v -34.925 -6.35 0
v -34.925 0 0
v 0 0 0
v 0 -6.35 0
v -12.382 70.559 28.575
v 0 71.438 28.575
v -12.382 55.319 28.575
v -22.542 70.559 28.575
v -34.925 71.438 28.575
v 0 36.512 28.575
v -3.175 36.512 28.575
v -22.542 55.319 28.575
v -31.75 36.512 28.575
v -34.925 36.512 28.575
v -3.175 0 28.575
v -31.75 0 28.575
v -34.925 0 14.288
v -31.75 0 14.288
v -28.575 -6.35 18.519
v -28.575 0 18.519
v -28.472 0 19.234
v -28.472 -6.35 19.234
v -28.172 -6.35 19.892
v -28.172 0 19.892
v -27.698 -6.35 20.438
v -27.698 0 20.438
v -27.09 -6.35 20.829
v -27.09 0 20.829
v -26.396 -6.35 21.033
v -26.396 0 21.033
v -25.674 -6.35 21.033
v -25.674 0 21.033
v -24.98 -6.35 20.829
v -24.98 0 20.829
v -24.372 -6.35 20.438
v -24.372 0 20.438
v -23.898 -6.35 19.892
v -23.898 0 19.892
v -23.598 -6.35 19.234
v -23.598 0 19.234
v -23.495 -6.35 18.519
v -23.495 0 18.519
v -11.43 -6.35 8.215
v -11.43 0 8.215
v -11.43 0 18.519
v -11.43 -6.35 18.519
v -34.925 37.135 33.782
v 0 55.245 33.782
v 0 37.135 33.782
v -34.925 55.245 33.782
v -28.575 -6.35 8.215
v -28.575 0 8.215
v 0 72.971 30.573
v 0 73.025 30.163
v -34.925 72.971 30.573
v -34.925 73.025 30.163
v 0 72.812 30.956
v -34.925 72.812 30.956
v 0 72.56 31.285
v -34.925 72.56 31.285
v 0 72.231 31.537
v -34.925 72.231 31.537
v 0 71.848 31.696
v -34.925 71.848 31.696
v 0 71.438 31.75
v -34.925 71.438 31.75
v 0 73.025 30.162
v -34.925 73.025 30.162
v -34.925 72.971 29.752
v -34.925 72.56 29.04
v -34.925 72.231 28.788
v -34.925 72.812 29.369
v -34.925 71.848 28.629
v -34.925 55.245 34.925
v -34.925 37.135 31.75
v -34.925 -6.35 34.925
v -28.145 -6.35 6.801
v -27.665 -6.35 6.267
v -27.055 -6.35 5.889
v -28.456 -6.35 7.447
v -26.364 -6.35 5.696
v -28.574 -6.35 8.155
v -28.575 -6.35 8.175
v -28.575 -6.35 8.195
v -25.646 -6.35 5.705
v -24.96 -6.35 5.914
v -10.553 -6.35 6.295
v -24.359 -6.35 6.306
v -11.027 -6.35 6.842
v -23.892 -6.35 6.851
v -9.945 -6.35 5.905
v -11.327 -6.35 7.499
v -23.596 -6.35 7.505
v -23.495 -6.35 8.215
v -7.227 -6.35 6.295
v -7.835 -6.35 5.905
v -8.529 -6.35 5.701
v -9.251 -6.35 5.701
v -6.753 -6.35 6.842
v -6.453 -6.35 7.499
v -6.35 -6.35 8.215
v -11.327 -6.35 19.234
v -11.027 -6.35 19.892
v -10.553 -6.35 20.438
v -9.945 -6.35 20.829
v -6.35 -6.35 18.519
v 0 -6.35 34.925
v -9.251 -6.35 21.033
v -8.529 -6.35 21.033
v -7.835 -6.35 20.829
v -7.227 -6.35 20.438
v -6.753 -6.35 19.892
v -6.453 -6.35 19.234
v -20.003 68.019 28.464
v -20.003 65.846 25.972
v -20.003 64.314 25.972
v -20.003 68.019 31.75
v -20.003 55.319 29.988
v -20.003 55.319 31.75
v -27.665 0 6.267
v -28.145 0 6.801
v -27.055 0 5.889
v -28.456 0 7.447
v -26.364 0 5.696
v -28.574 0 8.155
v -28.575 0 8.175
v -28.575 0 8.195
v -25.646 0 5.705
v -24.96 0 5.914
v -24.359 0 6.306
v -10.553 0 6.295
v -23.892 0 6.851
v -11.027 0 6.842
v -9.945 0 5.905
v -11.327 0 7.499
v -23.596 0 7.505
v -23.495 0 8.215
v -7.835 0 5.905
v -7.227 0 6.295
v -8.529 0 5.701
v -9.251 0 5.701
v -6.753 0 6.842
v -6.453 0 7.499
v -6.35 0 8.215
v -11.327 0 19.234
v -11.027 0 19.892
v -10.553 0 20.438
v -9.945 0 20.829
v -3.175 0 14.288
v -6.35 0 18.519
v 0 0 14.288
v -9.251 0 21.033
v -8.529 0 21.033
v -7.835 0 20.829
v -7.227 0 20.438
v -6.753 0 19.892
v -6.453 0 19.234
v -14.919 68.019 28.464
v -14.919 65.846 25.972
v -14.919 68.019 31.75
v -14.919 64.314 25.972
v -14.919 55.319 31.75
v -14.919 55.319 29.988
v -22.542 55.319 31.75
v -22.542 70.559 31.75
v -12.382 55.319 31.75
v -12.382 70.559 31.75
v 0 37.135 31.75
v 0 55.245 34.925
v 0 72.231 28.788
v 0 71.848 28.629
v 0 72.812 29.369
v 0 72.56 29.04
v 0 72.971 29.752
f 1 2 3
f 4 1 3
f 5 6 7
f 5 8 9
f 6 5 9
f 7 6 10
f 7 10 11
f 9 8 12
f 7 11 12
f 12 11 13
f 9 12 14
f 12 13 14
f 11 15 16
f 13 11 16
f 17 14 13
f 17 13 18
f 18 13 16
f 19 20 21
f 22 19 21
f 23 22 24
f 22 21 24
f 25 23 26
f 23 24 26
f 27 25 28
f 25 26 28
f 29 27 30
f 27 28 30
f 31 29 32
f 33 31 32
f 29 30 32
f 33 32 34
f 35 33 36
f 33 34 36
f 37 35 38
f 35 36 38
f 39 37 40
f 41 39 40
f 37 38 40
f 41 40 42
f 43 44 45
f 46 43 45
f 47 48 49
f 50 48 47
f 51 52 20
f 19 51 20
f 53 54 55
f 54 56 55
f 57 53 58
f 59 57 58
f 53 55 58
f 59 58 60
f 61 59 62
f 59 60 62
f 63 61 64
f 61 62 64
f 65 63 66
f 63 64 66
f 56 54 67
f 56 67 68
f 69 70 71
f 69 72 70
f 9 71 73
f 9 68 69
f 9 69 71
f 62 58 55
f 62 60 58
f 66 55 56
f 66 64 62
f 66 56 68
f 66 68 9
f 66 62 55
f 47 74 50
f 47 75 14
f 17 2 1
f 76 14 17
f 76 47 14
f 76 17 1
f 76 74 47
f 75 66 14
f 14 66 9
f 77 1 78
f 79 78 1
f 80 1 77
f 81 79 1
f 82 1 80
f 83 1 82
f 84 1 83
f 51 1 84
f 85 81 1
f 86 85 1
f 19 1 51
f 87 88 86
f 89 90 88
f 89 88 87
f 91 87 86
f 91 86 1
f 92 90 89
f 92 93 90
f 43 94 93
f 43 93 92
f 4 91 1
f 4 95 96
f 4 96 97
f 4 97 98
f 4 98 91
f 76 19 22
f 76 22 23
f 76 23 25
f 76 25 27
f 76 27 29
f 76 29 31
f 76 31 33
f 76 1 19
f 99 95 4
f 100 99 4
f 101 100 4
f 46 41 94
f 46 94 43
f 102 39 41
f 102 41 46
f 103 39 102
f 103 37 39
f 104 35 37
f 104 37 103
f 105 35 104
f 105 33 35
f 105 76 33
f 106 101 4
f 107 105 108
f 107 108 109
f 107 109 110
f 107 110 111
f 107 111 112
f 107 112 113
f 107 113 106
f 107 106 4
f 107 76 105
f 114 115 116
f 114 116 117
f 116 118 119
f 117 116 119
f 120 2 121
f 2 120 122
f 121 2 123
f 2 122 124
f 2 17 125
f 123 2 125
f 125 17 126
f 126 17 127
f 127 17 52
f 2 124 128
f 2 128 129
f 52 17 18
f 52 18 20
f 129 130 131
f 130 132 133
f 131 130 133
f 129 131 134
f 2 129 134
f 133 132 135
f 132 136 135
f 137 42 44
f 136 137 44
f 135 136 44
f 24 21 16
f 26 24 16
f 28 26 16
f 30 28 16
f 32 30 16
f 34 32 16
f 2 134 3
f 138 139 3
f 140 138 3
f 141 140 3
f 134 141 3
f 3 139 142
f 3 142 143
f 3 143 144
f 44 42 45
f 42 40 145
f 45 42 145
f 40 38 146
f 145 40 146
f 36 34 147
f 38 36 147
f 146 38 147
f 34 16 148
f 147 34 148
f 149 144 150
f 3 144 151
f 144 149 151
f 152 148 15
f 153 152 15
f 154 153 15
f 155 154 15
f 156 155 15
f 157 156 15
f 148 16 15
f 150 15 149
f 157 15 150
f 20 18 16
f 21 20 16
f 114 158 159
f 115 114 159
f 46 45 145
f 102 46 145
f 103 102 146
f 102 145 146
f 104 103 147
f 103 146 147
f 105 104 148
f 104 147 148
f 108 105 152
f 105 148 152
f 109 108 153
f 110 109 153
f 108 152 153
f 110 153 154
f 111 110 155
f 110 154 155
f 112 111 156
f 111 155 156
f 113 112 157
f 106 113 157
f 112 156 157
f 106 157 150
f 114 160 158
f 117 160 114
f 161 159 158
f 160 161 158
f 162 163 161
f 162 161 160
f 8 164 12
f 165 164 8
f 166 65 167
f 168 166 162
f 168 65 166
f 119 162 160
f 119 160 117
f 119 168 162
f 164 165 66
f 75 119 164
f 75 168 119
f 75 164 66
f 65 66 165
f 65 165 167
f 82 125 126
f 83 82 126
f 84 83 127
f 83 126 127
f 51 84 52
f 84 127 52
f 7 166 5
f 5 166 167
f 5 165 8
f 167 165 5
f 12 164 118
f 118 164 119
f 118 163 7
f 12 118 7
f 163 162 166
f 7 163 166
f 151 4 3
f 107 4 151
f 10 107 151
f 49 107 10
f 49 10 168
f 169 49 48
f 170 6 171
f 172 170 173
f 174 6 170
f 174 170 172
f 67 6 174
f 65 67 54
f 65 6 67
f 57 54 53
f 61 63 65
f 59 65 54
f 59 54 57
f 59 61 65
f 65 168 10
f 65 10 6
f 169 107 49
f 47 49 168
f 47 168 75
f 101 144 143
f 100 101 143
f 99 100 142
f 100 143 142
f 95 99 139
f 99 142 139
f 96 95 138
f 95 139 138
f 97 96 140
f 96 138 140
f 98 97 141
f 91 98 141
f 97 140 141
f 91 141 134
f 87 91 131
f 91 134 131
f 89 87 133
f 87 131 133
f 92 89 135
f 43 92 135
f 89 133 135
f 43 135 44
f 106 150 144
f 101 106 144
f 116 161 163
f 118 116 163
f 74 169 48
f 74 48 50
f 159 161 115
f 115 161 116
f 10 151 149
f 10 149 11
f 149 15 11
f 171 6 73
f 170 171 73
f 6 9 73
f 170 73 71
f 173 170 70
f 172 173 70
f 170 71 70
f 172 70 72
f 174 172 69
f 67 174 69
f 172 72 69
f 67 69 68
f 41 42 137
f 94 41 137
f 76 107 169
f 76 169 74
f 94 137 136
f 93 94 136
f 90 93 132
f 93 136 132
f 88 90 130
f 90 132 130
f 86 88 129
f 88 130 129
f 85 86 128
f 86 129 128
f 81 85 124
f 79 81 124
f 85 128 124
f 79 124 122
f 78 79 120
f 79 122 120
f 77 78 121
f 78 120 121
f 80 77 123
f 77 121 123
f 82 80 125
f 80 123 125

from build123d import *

# Parameters (mm, degrees)
F0_W      = 17.4625
F0_H      = 34.925
F1_DEPTH  = 6.35
F2_W      = 34.925
F2_H      = 6.35
F3_DEPTH  = 73.025
F5_DEPTH  = 3.175
F7_DEPTH  = 3.175
F8_W      = 34.925
F8_H      = 3.175
F9_DEPTH  = 17.78
F10_W     = 34.925
F10_H     = 1.143
F10_H_2   = 0.889
F11_DEPTH = 18.1102
F12_W     = 10.16
F12_H     = 15.24
F13_DEPTH = 25.4
F14_W     = 5.0834602067
F14_H     = 0.7943399184
F14_H_2   = 4.191
F15_DEPTH = 12.7
F17_DEPTH = 5.7404
F18_R     = 1.58749
F19_W     = 5.0834602067
F19_H     = 0.7931600816
F20_DEPTH = 12.7


# Not quite as in the source:
# - a fillet or chamfer is up to 0.001 mm smaller than in the source, because OpenCascade refuses the exact size
# - a feature names something its author has since deleted; it is built from what else it names


with BuildPart() as f1:
    # F0 (on Front) → F1 (new body)
    with BuildSketch(Plane.XZ):
        with Locations((-8.73125, 17.4625)):
            Rectangle(F0_W, F0_H)
        with BuildLine():
            ThreePointArc((-11.43, 18.5185023174), (-8.89, 21.0585023174), (-6.35, 18.5185023174))
            Line((-6.35, 18.5185023174), (-6.35, 8.2149775699))
            ThreePointArc((-6.35, 8.2149775699), (-8.89, 5.6749775699), (-11.43, 8.2149775699))
            Line((-11.43, 8.2149775699), (-11.43, 18.5185023174))
        make_face(mode=Mode.SUBTRACT)
        with Locations((-26.19375, 17.4625)):
            Rectangle(F0_W, F0_H)
        with BuildLine():
            Line((-23.495, 18.5185023174), (-23.495, 8.2149775699))
            ThreePointArc((-23.495, 8.2149775699), (-26.0048819907, 5.6751561381), (-28.5742857524, 8.154745786))
            ThreePointArc((-28.5742857524, 8.154745786), (-28.5748214318, 8.1848595606), (-28.575, 8.2149775699))
            Line((-28.575, 8.2149775699), (-28.575, 18.5185023174))
            ThreePointArc((-28.575, 18.5185023174), (-26.035, 21.0585023174), (-23.495, 18.5185023174))
        make_face(mode=Mode.SUBTRACT)
    extrude(amount=F1_DEPTH)

    # F2 (on face) → F3 (join)
    with BuildSketch(Plane(origin=(0, 0, 0), x_dir=(-1, 0, 0), z_dir=(0, 1, 0))):
        with Locations((17.4625, 31.75)):
            Rectangle(F2_W, F2_H)
    extrude(amount=F3_DEPTH)

    # F4 (on face) → F5 (join)
    with BuildSketch(Plane.YZ):
        Polygon((0, 28.575), (0, 14.2875), (36.5125, 28.575), align=None)
    extrude(amount=-F5_DEPTH)

    # F6 (on face) → F7 (join)
    with BuildSketch(Plane(origin=(-34.925, 0, 0), x_dir=(0, -1, 0), z_dir=(-1, 0, 0))):
        Polygon((-36.5125, 28.575), (0, 14.2875), (0, 28.575), align=None)
    extrude(amount=-F7_DEPTH)

    # F8 (on face) → F9 (cut)
    with BuildSketch(Plane(origin=(0, 73.025, 0), x_dir=(-1, 0, 0), z_dir=(0, 1, 0))):
        with Locations((17.4625, 33.3375)):
            Rectangle(F8_W, F8_H)
    extrude(amount=-F9_DEPTH, mode=Mode.SUBTRACT)

    # F10 (on face) → F11 (cut)
    with BuildSketch(Plane(origin=(0, 55.245, 0), x_dir=(-1, 0, 0), z_dir=(0, 1, 0))):
        with Locations((17.4625, 33.2105)):
            Rectangle(F10_W, F10_H)
        with Locations((17.4625, 32.1945)):
            Rectangle(F10_W, F10_H_2)
    extrude(amount=-F11_DEPTH, mode=Mode.SUBTRACT)

    # F12 (on face) → F13 (cut)
    with BuildSketch(Plane.XY.offset(31.75)):
        with Locations((-17.4625, 62.9390887916)):
            Rectangle(F12_W, F12_H)
    extrude(amount=-F13_DEPTH, mode=Mode.SUBTRACT)

    # F14 (on face) → F15 (join)
    with BuildSketch(Plane(origin=(0, 55.3190887916, 0), x_dir=(-1, 0, 0), z_dir=(0, 1, 0))):
        with Locations((17.4607698967, 30.5596699592)):
            Rectangle(F14_W, F14_H)
        with Locations((17.4607698967, 28.067)):
            Rectangle(F14_W, F14_H_2)
    extrude(amount=F15_DEPTH)

    # F16 (on face) → F17 (cut)
    with BuildSketch(Plane.YZ.offset(-14.9190397933)):
        Polygon((68.0190887916, 28.4641699592), (65.845951438, 25.9715), (67.369951438, 25.9715), (68.0190887916, 25.9715), align=None)
        Polygon((55.3190887916, 25.9715), (62.7900138497, 25.9715), (64.3140138497, 25.9715), (55.3190887916, 29.9881699592), (55.3190887916, 28.575), align=None)
    extrude(amount=-F17_DEPTH, mode=Mode.SUBTRACT)

    # F18 (radius 1.5875 in the source; OpenCascade refuses exactly that, so slightly less here)
    f18_edges = [f1.edges().sort_by_distance(p)[0] for p in [
        (-17.4625, 73.025, 31.75),
        (-17.4625, 73.025, 28.575),
    ]]
    fillet(f18_edges, radius=F18_R)

    # F19 (on face) → F20 (join)
    with BuildSketch(Plane(origin=(0, 55.3190887916, 0), x_dir=(-1, 0, 0), z_dir=(0, 1, 0))):
        with Locations((17.4607698967, 31.3534199592)):
            Rectangle(F19_W, F19_H)
    extrude(amount=F20_DEPTH)


solid = f1.part
